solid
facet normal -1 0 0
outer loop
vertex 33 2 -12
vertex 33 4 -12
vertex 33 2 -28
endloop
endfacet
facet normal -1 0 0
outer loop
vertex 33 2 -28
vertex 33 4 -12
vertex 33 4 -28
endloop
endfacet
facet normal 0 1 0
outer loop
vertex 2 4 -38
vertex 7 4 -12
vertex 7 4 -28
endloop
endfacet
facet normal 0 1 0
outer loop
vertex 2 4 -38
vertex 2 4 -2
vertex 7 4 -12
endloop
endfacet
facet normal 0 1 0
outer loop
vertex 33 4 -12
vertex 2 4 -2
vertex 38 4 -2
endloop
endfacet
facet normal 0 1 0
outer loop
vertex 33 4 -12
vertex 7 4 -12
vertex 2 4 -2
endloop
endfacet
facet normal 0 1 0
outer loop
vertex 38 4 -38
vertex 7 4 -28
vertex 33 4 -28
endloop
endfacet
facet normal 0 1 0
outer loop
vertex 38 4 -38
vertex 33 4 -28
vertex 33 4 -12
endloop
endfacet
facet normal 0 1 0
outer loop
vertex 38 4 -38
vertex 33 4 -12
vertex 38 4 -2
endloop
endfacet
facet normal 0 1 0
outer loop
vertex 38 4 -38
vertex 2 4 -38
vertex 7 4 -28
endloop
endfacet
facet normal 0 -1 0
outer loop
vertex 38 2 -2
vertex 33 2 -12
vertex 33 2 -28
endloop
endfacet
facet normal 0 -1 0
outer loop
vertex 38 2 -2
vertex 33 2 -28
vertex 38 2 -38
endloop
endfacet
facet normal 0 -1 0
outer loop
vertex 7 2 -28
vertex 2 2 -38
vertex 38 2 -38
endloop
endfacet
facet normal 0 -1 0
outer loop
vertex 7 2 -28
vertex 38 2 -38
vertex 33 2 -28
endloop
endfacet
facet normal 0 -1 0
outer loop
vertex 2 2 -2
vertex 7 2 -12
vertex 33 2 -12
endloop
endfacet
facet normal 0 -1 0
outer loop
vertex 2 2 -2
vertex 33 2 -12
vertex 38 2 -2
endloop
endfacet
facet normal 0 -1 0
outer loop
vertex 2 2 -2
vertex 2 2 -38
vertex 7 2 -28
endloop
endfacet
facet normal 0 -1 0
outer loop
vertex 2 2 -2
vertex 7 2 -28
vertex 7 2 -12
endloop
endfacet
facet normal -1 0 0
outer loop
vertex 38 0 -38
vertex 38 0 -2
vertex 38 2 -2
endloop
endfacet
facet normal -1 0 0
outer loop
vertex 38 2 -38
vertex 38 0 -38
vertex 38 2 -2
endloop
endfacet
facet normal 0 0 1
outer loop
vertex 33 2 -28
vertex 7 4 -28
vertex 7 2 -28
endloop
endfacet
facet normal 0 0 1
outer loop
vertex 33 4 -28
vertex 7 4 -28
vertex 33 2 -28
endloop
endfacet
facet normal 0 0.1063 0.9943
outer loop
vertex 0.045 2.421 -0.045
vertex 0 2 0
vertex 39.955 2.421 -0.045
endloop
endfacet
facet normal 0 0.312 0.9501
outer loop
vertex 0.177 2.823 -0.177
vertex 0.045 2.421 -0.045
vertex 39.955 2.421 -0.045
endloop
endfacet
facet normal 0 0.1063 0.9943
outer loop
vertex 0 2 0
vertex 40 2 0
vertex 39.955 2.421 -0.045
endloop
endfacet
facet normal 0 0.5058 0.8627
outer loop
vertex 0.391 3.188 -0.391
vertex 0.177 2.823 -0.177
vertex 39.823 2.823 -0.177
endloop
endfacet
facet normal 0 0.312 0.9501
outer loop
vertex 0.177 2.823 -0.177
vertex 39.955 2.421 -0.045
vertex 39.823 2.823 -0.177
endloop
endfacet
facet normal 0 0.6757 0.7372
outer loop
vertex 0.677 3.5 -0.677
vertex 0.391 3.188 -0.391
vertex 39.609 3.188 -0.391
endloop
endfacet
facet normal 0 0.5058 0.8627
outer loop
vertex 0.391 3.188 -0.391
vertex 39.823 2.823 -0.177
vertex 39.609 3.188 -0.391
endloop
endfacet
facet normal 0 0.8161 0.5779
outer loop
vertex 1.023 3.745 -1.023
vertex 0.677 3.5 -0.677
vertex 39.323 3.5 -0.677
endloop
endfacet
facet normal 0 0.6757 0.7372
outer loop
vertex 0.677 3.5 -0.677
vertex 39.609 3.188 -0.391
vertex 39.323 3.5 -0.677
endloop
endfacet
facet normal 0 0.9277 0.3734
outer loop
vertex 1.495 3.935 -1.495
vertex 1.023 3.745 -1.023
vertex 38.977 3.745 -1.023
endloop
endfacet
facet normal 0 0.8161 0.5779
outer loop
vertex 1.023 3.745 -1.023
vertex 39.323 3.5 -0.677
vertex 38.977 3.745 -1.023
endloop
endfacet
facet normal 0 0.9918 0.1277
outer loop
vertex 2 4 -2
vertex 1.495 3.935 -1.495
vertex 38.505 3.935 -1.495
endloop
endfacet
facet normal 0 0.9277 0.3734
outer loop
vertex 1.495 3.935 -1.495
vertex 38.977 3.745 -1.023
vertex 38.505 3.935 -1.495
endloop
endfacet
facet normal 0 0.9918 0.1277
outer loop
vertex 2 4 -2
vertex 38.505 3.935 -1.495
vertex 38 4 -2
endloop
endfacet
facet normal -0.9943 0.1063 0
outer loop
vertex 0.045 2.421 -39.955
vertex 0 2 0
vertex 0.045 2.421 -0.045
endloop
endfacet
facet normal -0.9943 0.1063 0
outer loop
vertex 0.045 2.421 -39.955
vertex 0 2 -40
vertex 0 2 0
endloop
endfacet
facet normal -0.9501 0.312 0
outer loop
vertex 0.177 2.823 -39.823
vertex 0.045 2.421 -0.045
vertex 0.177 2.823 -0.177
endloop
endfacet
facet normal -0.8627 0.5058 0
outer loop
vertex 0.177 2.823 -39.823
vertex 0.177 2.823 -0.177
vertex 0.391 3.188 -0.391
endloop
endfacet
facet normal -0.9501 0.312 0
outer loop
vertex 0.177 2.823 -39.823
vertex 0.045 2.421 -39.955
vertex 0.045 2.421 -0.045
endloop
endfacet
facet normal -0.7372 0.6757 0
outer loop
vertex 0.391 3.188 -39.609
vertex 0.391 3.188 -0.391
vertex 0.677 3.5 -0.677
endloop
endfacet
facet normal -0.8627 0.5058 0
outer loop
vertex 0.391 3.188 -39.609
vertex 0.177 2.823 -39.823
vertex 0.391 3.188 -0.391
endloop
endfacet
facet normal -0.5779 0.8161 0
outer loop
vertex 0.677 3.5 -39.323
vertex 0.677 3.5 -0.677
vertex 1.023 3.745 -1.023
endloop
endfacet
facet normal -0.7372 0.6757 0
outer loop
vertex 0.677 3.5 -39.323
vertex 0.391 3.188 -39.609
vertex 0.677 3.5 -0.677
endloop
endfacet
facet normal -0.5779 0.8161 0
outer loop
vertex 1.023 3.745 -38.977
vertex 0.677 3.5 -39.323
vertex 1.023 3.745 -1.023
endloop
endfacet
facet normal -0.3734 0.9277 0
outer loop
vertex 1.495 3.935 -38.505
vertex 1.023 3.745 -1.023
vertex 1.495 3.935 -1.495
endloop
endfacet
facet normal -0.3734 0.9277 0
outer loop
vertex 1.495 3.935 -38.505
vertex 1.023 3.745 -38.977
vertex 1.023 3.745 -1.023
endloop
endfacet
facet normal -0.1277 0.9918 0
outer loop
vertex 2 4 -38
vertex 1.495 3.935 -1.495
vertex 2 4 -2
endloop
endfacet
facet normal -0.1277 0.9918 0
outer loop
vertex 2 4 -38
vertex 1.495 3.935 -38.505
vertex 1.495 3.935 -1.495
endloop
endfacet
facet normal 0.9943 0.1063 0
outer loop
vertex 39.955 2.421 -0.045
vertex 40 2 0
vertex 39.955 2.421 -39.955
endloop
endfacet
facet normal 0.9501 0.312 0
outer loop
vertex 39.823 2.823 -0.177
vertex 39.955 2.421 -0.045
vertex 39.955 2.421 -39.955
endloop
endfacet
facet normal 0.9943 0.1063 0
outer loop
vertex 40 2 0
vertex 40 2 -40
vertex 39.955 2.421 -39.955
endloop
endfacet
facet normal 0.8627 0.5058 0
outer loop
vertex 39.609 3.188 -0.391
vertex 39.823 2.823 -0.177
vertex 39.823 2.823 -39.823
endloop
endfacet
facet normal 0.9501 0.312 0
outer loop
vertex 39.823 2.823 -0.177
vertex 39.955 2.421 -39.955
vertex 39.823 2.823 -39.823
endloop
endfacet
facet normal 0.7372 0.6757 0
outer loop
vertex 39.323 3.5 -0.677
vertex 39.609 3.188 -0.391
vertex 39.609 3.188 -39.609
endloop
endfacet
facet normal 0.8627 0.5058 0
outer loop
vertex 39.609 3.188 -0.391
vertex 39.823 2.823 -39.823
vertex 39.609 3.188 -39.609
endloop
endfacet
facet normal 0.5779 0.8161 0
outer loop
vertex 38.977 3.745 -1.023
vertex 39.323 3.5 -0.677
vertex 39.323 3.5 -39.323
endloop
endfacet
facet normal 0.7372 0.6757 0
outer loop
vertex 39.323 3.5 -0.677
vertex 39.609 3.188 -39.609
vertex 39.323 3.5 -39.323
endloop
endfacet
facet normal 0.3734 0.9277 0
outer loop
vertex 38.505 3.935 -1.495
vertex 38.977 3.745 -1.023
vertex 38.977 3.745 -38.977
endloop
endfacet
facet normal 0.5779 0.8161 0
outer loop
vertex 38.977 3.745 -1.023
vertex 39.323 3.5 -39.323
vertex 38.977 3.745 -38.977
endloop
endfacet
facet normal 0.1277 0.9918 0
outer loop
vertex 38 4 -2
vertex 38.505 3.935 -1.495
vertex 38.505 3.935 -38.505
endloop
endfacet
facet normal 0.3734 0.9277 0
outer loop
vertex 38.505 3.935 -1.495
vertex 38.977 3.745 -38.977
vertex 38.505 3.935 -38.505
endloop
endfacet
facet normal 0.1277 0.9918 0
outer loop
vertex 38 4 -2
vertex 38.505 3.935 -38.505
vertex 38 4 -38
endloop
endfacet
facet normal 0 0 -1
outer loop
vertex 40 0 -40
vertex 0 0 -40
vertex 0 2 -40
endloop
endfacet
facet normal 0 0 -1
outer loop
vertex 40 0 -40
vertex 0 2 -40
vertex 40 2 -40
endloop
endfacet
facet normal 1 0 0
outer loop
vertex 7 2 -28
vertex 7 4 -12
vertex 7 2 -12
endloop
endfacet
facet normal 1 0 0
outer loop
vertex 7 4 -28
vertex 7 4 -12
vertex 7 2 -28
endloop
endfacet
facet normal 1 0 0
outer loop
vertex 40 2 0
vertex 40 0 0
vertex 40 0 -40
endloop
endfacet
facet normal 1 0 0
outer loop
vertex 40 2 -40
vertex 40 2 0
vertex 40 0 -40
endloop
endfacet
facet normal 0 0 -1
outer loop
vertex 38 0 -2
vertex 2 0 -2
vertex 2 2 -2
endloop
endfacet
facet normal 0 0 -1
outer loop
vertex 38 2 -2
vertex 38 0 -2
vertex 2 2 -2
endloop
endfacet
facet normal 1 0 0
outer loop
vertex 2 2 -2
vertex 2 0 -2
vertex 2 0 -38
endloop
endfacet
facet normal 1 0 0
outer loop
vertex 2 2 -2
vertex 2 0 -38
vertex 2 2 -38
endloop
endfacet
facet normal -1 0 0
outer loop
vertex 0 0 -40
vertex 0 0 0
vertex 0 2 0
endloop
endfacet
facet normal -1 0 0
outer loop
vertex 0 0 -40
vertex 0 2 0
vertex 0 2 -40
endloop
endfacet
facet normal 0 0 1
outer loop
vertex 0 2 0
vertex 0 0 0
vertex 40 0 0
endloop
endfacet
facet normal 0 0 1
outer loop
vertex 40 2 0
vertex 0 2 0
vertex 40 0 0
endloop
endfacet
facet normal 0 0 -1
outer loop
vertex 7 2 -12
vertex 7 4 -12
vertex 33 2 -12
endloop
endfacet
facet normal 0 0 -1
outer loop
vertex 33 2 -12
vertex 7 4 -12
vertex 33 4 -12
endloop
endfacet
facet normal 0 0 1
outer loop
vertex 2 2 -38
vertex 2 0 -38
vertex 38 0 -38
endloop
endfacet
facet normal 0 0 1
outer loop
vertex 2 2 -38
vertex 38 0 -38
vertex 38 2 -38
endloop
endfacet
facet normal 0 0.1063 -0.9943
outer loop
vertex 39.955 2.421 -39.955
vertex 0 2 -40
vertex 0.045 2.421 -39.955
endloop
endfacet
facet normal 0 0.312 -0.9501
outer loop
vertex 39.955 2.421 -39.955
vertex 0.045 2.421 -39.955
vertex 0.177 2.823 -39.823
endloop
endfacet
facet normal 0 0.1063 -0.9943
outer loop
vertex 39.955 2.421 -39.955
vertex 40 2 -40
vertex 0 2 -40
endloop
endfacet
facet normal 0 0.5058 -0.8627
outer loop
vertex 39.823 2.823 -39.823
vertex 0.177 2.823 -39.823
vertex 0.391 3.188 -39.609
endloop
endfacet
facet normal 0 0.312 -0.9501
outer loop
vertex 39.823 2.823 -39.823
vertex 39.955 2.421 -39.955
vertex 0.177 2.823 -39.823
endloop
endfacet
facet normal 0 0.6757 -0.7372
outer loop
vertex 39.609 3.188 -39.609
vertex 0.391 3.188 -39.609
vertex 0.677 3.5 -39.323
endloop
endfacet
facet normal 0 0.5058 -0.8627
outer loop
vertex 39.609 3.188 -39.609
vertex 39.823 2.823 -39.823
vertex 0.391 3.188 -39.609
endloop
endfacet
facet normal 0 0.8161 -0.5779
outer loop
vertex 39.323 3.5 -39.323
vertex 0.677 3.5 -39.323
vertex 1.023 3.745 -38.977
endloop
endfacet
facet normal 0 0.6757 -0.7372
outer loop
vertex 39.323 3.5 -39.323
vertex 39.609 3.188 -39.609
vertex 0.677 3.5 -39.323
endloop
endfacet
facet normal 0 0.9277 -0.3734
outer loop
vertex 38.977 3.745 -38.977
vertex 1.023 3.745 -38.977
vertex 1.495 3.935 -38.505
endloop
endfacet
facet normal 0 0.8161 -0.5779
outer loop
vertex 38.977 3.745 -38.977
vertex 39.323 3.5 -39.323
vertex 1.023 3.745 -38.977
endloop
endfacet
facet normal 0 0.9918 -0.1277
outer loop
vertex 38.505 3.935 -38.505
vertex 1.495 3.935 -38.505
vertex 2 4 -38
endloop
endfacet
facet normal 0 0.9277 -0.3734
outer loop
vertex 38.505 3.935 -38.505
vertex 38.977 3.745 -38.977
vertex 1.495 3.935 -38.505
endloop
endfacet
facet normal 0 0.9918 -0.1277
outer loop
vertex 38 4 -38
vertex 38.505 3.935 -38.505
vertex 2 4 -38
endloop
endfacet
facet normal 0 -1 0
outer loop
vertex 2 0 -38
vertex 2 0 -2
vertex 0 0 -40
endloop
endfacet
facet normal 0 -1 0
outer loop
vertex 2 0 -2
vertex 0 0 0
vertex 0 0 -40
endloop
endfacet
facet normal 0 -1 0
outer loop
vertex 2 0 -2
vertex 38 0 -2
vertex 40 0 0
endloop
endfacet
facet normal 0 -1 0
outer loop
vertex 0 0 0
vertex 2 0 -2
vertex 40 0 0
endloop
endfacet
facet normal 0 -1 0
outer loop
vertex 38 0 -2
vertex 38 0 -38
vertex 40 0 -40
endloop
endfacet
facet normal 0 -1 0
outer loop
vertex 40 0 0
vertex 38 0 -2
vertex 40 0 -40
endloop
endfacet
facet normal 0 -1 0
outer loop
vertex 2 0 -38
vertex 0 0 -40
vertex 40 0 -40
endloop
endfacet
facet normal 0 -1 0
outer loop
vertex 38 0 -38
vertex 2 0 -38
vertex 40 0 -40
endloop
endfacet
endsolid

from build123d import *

# Parameters (mm, degrees)
SKETCH1_W           = 40
SKETCH1_H           = 40
BOSS_EXTRUDE1_DEPTH = 4
FILLET2_R           = 2
SHELL1_START        = 2
SHELL1_OUTLINE_W    = 2
SHELL1_OUTLINE_H    = 36
SHELL1_DEPTH        = 36
SKETCH2_W           = 26
SKETCH2_H           = 16
CUT_EXTRUDE1_DEPTH  = 4


# Read off the part's stored shape, not the designer's step: Shell1
with BuildPart() as part:
    # Sketch1 → Boss-Extrude1 (new body)
    with BuildSketch(Plane(origin=(0, 0, 0), x_dir=(1, 0, 0), z_dir=(0, 1, 0))):
        with Locations((20, 20)):
            Rectangle(SKETCH1_W, SKETCH1_H)
    extrude(amount=BOSS_EXTRUDE1_DEPTH)

    # Fillet2
    fillet2_edges = [part.edges().sort_by_distance(p)[0] for p in [
        (40, 4, -20),
        (20, 4, -40),
        (0, 4, -20),
        (20, 4, 0),
    ]]
    fillet(fillet2_edges, radius=FILLET2_R)

    # Shell1 outline → Shell1 (cut)
    with BuildSketch(Plane.YZ.offset(SHELL1_START)):
        with Locations((1, -20)):
            Rectangle(SHELL1_OUTLINE_W, SHELL1_OUTLINE_H)
    extrude(amount=SHELL1_DEPTH, mode=Mode.SUBTRACT)

    # Sketch2 → Cut-Extrude1 (cut)
    with BuildSketch(Plane(origin=(0, 4, 0), x_dir=(1, 0, 0), z_dir=(0, 1, 0))):
        with Locations((20, 20)):
            Rectangle(SKETCH2_W, SKETCH2_H)
    extrude(amount=-CUT_EXTRUDE1_DEPTH, mode=Mode.SUBTRACT)


solid = part.part
